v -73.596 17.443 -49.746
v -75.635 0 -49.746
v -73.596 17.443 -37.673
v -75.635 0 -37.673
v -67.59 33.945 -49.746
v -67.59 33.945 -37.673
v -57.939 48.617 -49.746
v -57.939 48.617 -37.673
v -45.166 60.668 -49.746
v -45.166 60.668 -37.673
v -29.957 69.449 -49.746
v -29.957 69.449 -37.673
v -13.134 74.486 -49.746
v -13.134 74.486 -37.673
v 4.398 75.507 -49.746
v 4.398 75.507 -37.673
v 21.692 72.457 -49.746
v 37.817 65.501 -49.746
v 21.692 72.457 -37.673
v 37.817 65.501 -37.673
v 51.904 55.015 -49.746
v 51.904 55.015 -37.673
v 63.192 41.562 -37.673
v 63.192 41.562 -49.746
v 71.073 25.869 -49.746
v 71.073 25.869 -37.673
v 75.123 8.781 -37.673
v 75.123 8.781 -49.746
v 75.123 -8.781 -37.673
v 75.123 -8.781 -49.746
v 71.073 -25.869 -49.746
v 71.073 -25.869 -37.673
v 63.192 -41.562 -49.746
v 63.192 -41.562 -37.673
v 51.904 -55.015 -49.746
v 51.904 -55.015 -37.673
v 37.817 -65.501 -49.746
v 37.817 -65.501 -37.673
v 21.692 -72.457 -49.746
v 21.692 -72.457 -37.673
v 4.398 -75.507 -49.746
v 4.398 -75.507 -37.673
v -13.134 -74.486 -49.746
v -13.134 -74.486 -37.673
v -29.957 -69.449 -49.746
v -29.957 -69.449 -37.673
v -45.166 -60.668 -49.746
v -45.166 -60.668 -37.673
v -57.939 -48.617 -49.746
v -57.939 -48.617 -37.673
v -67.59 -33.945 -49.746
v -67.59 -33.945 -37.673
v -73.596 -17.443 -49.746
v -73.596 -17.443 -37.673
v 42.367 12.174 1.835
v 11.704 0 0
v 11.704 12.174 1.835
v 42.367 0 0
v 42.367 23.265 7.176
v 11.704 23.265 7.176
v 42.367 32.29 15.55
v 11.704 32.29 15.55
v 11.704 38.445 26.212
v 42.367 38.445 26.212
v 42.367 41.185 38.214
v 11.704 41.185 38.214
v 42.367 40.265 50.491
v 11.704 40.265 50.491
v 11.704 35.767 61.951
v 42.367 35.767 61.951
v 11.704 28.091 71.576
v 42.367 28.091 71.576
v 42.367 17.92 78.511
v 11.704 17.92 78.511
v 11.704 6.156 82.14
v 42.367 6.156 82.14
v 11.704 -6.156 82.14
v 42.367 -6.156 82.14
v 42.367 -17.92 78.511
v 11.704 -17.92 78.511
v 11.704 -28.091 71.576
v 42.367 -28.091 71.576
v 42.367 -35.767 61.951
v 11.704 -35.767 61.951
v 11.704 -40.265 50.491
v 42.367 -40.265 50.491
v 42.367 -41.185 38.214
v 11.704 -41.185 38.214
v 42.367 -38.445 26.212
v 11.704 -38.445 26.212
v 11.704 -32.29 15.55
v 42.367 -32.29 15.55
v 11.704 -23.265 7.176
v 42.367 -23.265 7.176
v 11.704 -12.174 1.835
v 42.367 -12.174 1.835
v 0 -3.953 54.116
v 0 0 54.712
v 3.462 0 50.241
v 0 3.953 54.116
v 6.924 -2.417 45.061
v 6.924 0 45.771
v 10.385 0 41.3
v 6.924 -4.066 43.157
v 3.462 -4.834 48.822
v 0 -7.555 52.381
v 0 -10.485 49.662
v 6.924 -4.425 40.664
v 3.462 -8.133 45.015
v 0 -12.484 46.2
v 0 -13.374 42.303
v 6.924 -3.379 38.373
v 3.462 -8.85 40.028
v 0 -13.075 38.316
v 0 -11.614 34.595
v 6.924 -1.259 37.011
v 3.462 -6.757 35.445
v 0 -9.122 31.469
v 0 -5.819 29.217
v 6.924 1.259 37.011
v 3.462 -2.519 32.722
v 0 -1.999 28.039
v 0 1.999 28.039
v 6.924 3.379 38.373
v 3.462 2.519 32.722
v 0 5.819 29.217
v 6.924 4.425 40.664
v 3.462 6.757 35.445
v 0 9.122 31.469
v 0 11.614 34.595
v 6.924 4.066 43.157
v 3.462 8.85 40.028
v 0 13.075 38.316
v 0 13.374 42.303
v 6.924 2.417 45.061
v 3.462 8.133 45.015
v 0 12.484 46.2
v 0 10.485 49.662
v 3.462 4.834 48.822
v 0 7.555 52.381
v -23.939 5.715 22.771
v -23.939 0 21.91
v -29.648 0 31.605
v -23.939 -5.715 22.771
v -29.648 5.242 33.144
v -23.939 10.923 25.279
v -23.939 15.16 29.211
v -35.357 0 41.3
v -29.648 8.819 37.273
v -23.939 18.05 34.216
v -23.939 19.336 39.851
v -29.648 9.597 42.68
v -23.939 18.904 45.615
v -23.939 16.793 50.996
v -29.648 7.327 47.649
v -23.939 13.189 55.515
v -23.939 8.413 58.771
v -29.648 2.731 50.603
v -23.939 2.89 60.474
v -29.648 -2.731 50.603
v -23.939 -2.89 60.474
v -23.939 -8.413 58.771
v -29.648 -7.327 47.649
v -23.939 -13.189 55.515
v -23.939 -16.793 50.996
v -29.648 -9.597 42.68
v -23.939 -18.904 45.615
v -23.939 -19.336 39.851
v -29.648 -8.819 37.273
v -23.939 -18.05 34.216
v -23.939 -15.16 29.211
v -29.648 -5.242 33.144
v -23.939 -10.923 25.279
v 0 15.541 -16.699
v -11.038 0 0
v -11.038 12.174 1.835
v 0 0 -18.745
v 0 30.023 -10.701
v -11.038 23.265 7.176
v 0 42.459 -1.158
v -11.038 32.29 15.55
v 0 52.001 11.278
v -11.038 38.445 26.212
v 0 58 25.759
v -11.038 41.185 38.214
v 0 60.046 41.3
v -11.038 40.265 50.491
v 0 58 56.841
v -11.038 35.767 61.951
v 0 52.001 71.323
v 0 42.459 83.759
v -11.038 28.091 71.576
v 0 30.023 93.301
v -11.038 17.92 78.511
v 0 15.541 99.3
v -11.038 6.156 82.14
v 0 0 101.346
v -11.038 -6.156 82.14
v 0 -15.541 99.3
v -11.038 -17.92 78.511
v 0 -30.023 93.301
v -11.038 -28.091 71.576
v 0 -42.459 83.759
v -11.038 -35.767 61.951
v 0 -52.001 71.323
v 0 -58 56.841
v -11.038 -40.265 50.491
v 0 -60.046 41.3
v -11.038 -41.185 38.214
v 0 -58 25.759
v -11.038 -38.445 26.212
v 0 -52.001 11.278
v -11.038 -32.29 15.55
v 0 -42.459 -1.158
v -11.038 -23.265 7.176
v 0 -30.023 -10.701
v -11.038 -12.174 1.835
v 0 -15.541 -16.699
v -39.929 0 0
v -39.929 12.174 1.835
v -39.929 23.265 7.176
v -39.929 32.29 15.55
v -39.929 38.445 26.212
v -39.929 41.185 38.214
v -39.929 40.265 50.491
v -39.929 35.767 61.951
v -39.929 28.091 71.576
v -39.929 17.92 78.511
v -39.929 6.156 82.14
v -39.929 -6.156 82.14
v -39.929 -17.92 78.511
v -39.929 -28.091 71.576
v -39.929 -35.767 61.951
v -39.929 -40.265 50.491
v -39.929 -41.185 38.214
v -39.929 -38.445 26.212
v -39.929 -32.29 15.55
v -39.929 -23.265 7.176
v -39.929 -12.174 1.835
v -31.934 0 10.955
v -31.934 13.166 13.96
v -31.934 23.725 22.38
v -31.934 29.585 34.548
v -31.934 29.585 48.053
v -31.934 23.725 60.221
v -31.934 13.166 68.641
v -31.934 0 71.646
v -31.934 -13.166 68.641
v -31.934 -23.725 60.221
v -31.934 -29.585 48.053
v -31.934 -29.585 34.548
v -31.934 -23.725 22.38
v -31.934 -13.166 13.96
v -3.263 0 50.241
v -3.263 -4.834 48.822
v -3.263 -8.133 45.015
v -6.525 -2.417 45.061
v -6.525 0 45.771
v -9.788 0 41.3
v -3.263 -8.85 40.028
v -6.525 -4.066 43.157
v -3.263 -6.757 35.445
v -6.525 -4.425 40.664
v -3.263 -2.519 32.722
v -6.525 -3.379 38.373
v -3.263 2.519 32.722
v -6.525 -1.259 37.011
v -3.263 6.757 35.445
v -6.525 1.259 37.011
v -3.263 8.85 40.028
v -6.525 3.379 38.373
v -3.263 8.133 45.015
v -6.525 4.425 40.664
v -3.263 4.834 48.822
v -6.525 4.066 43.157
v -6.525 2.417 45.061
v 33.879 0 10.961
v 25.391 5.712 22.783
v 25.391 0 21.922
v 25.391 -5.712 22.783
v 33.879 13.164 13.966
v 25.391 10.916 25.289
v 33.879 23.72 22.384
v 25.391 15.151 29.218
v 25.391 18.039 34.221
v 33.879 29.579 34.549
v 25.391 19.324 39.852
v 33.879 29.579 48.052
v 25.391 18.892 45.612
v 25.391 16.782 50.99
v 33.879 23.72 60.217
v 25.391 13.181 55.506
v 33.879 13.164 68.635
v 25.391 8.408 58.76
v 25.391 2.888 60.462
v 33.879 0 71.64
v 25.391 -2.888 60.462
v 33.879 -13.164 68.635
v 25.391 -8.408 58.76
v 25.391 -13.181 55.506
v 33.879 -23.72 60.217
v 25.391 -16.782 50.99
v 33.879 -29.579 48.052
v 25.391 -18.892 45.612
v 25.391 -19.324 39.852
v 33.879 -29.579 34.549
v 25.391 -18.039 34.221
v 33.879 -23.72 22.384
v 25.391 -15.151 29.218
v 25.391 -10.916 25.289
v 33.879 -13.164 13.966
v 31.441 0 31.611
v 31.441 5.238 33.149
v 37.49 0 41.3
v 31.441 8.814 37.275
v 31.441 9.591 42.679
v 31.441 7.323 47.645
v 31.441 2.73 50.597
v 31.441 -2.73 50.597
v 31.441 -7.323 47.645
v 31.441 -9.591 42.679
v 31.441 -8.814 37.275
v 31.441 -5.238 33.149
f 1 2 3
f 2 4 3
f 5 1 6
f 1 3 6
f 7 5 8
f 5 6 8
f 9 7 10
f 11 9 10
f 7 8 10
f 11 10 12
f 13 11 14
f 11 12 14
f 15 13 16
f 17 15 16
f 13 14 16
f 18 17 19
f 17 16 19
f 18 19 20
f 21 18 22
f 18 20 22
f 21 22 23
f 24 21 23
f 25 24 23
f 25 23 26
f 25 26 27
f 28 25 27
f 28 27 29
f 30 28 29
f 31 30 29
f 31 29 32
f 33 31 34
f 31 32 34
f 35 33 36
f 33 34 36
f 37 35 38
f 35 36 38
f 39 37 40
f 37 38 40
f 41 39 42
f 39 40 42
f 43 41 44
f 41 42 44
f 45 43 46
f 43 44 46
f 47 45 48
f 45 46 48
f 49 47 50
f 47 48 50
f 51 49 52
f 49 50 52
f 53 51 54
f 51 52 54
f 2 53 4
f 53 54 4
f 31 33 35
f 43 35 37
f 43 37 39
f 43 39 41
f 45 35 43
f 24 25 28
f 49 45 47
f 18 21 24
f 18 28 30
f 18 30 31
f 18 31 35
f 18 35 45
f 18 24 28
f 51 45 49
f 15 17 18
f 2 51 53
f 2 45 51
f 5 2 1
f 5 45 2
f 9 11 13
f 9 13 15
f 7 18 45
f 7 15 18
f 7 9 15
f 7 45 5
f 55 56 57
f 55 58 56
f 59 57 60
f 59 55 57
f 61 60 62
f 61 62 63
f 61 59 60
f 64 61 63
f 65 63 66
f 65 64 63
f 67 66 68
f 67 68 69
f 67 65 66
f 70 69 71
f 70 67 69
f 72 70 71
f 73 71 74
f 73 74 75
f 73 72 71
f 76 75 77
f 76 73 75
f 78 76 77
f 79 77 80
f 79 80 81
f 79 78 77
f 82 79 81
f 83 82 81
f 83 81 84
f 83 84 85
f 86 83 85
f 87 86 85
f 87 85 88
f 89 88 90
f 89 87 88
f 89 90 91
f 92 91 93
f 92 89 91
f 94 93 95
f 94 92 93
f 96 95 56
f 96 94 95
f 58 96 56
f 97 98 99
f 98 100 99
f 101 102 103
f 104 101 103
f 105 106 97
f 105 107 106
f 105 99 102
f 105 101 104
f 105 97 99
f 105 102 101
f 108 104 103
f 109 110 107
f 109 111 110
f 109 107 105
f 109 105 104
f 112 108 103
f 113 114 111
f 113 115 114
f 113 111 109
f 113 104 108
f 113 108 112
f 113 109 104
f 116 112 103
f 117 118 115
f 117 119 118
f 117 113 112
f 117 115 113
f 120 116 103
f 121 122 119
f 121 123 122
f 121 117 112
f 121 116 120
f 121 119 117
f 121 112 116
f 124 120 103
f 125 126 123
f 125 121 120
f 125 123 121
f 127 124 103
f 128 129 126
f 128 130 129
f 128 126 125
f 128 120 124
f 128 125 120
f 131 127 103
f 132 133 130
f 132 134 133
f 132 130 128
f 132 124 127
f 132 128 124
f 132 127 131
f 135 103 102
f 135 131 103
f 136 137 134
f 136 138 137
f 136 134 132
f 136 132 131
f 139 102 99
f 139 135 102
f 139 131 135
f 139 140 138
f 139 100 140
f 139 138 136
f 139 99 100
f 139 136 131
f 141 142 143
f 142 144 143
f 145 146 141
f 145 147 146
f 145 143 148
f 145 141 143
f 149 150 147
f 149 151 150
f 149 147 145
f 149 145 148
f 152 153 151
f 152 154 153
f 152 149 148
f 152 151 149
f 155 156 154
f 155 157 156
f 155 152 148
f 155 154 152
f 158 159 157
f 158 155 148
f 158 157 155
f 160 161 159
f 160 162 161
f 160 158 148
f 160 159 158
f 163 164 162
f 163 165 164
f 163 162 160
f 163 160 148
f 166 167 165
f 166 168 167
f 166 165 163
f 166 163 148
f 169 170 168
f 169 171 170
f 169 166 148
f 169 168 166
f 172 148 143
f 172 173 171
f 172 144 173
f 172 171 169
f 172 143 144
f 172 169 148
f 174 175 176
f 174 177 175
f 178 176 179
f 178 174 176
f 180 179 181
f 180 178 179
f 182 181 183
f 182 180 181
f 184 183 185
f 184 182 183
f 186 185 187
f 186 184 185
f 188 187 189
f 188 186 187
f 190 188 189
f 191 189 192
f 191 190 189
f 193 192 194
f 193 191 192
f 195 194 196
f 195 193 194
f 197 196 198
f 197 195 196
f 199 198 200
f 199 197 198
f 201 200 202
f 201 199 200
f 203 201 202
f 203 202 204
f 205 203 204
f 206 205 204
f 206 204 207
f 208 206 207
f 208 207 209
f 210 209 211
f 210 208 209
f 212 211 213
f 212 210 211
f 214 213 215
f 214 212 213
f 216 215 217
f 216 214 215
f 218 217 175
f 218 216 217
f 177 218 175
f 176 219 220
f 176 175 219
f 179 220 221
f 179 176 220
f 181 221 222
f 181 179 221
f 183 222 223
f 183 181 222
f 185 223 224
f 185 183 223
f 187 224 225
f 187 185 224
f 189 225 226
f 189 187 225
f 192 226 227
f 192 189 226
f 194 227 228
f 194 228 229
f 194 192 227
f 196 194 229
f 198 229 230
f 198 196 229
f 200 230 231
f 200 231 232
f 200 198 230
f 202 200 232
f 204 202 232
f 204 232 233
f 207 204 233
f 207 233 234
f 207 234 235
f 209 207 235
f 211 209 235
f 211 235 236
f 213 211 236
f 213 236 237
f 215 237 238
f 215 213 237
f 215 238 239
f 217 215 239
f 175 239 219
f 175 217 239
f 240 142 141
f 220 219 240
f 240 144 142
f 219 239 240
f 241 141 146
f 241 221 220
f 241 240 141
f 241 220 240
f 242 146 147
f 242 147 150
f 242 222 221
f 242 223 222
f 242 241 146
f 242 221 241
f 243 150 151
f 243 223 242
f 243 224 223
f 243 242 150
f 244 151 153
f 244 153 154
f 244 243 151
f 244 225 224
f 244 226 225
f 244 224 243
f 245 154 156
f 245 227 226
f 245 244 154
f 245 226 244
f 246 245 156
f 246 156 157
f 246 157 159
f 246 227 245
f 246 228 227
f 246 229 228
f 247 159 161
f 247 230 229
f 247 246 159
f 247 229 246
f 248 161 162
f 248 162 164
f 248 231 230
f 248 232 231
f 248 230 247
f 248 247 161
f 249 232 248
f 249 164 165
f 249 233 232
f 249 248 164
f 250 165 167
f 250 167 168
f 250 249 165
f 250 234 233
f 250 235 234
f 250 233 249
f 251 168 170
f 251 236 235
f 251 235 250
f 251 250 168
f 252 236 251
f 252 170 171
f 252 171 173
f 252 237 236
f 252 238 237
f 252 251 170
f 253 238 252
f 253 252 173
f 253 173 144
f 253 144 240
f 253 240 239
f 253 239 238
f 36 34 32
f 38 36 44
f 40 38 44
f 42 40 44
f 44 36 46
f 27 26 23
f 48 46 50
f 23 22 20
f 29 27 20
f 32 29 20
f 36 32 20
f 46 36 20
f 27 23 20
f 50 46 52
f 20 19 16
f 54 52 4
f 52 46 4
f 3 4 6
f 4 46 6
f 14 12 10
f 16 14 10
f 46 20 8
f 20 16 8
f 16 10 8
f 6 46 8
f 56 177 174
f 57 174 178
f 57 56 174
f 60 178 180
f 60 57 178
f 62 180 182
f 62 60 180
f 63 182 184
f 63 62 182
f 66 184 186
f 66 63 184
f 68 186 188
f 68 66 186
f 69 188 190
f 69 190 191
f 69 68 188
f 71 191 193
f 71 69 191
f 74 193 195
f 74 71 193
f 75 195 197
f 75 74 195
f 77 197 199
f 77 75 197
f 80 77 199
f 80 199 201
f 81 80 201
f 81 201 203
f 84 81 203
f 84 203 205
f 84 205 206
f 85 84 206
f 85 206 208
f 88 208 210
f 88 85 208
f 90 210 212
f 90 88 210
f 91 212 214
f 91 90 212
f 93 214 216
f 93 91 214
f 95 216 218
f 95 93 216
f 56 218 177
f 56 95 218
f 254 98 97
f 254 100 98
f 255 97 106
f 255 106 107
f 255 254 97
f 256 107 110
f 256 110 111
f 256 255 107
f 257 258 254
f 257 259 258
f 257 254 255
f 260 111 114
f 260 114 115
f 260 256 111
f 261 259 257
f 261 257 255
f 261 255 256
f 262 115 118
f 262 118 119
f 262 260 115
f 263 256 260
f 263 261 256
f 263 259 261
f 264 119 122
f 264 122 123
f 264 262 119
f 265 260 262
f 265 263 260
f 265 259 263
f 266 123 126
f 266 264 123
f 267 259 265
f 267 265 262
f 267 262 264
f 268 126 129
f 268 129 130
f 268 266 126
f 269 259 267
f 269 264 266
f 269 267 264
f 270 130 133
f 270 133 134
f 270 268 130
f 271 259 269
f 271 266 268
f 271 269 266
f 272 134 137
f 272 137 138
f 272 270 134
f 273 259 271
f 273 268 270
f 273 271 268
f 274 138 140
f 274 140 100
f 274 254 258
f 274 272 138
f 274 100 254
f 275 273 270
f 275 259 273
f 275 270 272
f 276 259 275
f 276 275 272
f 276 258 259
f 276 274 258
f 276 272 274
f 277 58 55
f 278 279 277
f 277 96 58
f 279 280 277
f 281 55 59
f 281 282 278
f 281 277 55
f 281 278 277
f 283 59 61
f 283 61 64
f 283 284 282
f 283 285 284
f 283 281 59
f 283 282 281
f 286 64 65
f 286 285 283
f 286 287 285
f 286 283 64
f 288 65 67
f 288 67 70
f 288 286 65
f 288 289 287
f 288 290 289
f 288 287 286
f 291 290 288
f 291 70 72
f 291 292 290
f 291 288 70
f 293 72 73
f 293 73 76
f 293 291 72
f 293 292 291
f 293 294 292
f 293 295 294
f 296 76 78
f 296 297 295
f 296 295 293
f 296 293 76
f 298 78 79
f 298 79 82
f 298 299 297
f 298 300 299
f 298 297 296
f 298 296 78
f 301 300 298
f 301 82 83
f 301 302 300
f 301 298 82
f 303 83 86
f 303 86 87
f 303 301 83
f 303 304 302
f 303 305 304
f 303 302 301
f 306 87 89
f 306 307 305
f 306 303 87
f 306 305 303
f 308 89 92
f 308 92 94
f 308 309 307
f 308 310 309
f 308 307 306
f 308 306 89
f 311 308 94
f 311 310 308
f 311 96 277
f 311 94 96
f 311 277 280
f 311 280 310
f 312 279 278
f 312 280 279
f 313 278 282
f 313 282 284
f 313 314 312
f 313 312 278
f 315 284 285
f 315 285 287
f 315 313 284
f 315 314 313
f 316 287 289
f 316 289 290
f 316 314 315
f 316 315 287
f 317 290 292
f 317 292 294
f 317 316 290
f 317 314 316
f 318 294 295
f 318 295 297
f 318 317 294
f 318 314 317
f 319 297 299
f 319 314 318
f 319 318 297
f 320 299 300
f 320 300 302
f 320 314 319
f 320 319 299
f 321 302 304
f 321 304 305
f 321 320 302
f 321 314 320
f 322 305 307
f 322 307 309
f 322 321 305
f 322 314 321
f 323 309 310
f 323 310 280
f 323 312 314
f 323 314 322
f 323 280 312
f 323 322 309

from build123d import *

# Parameters (mm, degrees)
F2_W = 75.634598732
F2_H = 12.0731294155


with BuildPart() as f1:
    # F0 (on Front) → F1 (revolve)
    with BuildSketch(Plane.XZ):
        Polygon((10.3852734835, 41.3004010916), (0, 54.7115989029), (-9.7875599346, 41.3004010916), align=None)
        Polygon((10.3852734835, 41.3004010916), (-9.7875599346, 41.3004010916), (-23.9389554322, 21.9097495304), (-11.0377831406, 0), (11.7038563714, 0), (25.3912828526, 21.9221381765), align=None)
        Polygon((-23.9389554322, 21.9097495304), (-9.7875599346, 41.3004010916), (-35.3568010032, 41.3004010916), align=None)
        Polygon((37.490401417, 41.3004010916), (10.3852734835, 41.3004010916), (25.3912828526, 21.9221381765), align=None)
        Polygon((-11.0377831406, 0), (-23.9389554322, 21.9097495304), (-39.9288013577, 0), align=None)
        Polygon((42.3672012985, 0), (25.3912828526, 21.9221381765), (11.7038563714, 0), align=None)
        Polygon((11.7038563714, 0), (-11.0377831406, 0), (0, -18.7452007085), align=None)
    revolve(axis=Axis((1.0668002069, 0, 41.3004010916), (1, 0, 0)))


with BuildPart() as f3:
    # F2 (on Front) → F3 (revolve)
    with BuildSketch(Plane.XZ):
        with Locations((-37.817299366, -43.7090806663)):
            Rectangle(F2_W, F2_H)
    revolve(axis=Axis((0, 0, -43.7090806663), (0, 0, -1)))


solid = Compound([f1.part, f3.part])
